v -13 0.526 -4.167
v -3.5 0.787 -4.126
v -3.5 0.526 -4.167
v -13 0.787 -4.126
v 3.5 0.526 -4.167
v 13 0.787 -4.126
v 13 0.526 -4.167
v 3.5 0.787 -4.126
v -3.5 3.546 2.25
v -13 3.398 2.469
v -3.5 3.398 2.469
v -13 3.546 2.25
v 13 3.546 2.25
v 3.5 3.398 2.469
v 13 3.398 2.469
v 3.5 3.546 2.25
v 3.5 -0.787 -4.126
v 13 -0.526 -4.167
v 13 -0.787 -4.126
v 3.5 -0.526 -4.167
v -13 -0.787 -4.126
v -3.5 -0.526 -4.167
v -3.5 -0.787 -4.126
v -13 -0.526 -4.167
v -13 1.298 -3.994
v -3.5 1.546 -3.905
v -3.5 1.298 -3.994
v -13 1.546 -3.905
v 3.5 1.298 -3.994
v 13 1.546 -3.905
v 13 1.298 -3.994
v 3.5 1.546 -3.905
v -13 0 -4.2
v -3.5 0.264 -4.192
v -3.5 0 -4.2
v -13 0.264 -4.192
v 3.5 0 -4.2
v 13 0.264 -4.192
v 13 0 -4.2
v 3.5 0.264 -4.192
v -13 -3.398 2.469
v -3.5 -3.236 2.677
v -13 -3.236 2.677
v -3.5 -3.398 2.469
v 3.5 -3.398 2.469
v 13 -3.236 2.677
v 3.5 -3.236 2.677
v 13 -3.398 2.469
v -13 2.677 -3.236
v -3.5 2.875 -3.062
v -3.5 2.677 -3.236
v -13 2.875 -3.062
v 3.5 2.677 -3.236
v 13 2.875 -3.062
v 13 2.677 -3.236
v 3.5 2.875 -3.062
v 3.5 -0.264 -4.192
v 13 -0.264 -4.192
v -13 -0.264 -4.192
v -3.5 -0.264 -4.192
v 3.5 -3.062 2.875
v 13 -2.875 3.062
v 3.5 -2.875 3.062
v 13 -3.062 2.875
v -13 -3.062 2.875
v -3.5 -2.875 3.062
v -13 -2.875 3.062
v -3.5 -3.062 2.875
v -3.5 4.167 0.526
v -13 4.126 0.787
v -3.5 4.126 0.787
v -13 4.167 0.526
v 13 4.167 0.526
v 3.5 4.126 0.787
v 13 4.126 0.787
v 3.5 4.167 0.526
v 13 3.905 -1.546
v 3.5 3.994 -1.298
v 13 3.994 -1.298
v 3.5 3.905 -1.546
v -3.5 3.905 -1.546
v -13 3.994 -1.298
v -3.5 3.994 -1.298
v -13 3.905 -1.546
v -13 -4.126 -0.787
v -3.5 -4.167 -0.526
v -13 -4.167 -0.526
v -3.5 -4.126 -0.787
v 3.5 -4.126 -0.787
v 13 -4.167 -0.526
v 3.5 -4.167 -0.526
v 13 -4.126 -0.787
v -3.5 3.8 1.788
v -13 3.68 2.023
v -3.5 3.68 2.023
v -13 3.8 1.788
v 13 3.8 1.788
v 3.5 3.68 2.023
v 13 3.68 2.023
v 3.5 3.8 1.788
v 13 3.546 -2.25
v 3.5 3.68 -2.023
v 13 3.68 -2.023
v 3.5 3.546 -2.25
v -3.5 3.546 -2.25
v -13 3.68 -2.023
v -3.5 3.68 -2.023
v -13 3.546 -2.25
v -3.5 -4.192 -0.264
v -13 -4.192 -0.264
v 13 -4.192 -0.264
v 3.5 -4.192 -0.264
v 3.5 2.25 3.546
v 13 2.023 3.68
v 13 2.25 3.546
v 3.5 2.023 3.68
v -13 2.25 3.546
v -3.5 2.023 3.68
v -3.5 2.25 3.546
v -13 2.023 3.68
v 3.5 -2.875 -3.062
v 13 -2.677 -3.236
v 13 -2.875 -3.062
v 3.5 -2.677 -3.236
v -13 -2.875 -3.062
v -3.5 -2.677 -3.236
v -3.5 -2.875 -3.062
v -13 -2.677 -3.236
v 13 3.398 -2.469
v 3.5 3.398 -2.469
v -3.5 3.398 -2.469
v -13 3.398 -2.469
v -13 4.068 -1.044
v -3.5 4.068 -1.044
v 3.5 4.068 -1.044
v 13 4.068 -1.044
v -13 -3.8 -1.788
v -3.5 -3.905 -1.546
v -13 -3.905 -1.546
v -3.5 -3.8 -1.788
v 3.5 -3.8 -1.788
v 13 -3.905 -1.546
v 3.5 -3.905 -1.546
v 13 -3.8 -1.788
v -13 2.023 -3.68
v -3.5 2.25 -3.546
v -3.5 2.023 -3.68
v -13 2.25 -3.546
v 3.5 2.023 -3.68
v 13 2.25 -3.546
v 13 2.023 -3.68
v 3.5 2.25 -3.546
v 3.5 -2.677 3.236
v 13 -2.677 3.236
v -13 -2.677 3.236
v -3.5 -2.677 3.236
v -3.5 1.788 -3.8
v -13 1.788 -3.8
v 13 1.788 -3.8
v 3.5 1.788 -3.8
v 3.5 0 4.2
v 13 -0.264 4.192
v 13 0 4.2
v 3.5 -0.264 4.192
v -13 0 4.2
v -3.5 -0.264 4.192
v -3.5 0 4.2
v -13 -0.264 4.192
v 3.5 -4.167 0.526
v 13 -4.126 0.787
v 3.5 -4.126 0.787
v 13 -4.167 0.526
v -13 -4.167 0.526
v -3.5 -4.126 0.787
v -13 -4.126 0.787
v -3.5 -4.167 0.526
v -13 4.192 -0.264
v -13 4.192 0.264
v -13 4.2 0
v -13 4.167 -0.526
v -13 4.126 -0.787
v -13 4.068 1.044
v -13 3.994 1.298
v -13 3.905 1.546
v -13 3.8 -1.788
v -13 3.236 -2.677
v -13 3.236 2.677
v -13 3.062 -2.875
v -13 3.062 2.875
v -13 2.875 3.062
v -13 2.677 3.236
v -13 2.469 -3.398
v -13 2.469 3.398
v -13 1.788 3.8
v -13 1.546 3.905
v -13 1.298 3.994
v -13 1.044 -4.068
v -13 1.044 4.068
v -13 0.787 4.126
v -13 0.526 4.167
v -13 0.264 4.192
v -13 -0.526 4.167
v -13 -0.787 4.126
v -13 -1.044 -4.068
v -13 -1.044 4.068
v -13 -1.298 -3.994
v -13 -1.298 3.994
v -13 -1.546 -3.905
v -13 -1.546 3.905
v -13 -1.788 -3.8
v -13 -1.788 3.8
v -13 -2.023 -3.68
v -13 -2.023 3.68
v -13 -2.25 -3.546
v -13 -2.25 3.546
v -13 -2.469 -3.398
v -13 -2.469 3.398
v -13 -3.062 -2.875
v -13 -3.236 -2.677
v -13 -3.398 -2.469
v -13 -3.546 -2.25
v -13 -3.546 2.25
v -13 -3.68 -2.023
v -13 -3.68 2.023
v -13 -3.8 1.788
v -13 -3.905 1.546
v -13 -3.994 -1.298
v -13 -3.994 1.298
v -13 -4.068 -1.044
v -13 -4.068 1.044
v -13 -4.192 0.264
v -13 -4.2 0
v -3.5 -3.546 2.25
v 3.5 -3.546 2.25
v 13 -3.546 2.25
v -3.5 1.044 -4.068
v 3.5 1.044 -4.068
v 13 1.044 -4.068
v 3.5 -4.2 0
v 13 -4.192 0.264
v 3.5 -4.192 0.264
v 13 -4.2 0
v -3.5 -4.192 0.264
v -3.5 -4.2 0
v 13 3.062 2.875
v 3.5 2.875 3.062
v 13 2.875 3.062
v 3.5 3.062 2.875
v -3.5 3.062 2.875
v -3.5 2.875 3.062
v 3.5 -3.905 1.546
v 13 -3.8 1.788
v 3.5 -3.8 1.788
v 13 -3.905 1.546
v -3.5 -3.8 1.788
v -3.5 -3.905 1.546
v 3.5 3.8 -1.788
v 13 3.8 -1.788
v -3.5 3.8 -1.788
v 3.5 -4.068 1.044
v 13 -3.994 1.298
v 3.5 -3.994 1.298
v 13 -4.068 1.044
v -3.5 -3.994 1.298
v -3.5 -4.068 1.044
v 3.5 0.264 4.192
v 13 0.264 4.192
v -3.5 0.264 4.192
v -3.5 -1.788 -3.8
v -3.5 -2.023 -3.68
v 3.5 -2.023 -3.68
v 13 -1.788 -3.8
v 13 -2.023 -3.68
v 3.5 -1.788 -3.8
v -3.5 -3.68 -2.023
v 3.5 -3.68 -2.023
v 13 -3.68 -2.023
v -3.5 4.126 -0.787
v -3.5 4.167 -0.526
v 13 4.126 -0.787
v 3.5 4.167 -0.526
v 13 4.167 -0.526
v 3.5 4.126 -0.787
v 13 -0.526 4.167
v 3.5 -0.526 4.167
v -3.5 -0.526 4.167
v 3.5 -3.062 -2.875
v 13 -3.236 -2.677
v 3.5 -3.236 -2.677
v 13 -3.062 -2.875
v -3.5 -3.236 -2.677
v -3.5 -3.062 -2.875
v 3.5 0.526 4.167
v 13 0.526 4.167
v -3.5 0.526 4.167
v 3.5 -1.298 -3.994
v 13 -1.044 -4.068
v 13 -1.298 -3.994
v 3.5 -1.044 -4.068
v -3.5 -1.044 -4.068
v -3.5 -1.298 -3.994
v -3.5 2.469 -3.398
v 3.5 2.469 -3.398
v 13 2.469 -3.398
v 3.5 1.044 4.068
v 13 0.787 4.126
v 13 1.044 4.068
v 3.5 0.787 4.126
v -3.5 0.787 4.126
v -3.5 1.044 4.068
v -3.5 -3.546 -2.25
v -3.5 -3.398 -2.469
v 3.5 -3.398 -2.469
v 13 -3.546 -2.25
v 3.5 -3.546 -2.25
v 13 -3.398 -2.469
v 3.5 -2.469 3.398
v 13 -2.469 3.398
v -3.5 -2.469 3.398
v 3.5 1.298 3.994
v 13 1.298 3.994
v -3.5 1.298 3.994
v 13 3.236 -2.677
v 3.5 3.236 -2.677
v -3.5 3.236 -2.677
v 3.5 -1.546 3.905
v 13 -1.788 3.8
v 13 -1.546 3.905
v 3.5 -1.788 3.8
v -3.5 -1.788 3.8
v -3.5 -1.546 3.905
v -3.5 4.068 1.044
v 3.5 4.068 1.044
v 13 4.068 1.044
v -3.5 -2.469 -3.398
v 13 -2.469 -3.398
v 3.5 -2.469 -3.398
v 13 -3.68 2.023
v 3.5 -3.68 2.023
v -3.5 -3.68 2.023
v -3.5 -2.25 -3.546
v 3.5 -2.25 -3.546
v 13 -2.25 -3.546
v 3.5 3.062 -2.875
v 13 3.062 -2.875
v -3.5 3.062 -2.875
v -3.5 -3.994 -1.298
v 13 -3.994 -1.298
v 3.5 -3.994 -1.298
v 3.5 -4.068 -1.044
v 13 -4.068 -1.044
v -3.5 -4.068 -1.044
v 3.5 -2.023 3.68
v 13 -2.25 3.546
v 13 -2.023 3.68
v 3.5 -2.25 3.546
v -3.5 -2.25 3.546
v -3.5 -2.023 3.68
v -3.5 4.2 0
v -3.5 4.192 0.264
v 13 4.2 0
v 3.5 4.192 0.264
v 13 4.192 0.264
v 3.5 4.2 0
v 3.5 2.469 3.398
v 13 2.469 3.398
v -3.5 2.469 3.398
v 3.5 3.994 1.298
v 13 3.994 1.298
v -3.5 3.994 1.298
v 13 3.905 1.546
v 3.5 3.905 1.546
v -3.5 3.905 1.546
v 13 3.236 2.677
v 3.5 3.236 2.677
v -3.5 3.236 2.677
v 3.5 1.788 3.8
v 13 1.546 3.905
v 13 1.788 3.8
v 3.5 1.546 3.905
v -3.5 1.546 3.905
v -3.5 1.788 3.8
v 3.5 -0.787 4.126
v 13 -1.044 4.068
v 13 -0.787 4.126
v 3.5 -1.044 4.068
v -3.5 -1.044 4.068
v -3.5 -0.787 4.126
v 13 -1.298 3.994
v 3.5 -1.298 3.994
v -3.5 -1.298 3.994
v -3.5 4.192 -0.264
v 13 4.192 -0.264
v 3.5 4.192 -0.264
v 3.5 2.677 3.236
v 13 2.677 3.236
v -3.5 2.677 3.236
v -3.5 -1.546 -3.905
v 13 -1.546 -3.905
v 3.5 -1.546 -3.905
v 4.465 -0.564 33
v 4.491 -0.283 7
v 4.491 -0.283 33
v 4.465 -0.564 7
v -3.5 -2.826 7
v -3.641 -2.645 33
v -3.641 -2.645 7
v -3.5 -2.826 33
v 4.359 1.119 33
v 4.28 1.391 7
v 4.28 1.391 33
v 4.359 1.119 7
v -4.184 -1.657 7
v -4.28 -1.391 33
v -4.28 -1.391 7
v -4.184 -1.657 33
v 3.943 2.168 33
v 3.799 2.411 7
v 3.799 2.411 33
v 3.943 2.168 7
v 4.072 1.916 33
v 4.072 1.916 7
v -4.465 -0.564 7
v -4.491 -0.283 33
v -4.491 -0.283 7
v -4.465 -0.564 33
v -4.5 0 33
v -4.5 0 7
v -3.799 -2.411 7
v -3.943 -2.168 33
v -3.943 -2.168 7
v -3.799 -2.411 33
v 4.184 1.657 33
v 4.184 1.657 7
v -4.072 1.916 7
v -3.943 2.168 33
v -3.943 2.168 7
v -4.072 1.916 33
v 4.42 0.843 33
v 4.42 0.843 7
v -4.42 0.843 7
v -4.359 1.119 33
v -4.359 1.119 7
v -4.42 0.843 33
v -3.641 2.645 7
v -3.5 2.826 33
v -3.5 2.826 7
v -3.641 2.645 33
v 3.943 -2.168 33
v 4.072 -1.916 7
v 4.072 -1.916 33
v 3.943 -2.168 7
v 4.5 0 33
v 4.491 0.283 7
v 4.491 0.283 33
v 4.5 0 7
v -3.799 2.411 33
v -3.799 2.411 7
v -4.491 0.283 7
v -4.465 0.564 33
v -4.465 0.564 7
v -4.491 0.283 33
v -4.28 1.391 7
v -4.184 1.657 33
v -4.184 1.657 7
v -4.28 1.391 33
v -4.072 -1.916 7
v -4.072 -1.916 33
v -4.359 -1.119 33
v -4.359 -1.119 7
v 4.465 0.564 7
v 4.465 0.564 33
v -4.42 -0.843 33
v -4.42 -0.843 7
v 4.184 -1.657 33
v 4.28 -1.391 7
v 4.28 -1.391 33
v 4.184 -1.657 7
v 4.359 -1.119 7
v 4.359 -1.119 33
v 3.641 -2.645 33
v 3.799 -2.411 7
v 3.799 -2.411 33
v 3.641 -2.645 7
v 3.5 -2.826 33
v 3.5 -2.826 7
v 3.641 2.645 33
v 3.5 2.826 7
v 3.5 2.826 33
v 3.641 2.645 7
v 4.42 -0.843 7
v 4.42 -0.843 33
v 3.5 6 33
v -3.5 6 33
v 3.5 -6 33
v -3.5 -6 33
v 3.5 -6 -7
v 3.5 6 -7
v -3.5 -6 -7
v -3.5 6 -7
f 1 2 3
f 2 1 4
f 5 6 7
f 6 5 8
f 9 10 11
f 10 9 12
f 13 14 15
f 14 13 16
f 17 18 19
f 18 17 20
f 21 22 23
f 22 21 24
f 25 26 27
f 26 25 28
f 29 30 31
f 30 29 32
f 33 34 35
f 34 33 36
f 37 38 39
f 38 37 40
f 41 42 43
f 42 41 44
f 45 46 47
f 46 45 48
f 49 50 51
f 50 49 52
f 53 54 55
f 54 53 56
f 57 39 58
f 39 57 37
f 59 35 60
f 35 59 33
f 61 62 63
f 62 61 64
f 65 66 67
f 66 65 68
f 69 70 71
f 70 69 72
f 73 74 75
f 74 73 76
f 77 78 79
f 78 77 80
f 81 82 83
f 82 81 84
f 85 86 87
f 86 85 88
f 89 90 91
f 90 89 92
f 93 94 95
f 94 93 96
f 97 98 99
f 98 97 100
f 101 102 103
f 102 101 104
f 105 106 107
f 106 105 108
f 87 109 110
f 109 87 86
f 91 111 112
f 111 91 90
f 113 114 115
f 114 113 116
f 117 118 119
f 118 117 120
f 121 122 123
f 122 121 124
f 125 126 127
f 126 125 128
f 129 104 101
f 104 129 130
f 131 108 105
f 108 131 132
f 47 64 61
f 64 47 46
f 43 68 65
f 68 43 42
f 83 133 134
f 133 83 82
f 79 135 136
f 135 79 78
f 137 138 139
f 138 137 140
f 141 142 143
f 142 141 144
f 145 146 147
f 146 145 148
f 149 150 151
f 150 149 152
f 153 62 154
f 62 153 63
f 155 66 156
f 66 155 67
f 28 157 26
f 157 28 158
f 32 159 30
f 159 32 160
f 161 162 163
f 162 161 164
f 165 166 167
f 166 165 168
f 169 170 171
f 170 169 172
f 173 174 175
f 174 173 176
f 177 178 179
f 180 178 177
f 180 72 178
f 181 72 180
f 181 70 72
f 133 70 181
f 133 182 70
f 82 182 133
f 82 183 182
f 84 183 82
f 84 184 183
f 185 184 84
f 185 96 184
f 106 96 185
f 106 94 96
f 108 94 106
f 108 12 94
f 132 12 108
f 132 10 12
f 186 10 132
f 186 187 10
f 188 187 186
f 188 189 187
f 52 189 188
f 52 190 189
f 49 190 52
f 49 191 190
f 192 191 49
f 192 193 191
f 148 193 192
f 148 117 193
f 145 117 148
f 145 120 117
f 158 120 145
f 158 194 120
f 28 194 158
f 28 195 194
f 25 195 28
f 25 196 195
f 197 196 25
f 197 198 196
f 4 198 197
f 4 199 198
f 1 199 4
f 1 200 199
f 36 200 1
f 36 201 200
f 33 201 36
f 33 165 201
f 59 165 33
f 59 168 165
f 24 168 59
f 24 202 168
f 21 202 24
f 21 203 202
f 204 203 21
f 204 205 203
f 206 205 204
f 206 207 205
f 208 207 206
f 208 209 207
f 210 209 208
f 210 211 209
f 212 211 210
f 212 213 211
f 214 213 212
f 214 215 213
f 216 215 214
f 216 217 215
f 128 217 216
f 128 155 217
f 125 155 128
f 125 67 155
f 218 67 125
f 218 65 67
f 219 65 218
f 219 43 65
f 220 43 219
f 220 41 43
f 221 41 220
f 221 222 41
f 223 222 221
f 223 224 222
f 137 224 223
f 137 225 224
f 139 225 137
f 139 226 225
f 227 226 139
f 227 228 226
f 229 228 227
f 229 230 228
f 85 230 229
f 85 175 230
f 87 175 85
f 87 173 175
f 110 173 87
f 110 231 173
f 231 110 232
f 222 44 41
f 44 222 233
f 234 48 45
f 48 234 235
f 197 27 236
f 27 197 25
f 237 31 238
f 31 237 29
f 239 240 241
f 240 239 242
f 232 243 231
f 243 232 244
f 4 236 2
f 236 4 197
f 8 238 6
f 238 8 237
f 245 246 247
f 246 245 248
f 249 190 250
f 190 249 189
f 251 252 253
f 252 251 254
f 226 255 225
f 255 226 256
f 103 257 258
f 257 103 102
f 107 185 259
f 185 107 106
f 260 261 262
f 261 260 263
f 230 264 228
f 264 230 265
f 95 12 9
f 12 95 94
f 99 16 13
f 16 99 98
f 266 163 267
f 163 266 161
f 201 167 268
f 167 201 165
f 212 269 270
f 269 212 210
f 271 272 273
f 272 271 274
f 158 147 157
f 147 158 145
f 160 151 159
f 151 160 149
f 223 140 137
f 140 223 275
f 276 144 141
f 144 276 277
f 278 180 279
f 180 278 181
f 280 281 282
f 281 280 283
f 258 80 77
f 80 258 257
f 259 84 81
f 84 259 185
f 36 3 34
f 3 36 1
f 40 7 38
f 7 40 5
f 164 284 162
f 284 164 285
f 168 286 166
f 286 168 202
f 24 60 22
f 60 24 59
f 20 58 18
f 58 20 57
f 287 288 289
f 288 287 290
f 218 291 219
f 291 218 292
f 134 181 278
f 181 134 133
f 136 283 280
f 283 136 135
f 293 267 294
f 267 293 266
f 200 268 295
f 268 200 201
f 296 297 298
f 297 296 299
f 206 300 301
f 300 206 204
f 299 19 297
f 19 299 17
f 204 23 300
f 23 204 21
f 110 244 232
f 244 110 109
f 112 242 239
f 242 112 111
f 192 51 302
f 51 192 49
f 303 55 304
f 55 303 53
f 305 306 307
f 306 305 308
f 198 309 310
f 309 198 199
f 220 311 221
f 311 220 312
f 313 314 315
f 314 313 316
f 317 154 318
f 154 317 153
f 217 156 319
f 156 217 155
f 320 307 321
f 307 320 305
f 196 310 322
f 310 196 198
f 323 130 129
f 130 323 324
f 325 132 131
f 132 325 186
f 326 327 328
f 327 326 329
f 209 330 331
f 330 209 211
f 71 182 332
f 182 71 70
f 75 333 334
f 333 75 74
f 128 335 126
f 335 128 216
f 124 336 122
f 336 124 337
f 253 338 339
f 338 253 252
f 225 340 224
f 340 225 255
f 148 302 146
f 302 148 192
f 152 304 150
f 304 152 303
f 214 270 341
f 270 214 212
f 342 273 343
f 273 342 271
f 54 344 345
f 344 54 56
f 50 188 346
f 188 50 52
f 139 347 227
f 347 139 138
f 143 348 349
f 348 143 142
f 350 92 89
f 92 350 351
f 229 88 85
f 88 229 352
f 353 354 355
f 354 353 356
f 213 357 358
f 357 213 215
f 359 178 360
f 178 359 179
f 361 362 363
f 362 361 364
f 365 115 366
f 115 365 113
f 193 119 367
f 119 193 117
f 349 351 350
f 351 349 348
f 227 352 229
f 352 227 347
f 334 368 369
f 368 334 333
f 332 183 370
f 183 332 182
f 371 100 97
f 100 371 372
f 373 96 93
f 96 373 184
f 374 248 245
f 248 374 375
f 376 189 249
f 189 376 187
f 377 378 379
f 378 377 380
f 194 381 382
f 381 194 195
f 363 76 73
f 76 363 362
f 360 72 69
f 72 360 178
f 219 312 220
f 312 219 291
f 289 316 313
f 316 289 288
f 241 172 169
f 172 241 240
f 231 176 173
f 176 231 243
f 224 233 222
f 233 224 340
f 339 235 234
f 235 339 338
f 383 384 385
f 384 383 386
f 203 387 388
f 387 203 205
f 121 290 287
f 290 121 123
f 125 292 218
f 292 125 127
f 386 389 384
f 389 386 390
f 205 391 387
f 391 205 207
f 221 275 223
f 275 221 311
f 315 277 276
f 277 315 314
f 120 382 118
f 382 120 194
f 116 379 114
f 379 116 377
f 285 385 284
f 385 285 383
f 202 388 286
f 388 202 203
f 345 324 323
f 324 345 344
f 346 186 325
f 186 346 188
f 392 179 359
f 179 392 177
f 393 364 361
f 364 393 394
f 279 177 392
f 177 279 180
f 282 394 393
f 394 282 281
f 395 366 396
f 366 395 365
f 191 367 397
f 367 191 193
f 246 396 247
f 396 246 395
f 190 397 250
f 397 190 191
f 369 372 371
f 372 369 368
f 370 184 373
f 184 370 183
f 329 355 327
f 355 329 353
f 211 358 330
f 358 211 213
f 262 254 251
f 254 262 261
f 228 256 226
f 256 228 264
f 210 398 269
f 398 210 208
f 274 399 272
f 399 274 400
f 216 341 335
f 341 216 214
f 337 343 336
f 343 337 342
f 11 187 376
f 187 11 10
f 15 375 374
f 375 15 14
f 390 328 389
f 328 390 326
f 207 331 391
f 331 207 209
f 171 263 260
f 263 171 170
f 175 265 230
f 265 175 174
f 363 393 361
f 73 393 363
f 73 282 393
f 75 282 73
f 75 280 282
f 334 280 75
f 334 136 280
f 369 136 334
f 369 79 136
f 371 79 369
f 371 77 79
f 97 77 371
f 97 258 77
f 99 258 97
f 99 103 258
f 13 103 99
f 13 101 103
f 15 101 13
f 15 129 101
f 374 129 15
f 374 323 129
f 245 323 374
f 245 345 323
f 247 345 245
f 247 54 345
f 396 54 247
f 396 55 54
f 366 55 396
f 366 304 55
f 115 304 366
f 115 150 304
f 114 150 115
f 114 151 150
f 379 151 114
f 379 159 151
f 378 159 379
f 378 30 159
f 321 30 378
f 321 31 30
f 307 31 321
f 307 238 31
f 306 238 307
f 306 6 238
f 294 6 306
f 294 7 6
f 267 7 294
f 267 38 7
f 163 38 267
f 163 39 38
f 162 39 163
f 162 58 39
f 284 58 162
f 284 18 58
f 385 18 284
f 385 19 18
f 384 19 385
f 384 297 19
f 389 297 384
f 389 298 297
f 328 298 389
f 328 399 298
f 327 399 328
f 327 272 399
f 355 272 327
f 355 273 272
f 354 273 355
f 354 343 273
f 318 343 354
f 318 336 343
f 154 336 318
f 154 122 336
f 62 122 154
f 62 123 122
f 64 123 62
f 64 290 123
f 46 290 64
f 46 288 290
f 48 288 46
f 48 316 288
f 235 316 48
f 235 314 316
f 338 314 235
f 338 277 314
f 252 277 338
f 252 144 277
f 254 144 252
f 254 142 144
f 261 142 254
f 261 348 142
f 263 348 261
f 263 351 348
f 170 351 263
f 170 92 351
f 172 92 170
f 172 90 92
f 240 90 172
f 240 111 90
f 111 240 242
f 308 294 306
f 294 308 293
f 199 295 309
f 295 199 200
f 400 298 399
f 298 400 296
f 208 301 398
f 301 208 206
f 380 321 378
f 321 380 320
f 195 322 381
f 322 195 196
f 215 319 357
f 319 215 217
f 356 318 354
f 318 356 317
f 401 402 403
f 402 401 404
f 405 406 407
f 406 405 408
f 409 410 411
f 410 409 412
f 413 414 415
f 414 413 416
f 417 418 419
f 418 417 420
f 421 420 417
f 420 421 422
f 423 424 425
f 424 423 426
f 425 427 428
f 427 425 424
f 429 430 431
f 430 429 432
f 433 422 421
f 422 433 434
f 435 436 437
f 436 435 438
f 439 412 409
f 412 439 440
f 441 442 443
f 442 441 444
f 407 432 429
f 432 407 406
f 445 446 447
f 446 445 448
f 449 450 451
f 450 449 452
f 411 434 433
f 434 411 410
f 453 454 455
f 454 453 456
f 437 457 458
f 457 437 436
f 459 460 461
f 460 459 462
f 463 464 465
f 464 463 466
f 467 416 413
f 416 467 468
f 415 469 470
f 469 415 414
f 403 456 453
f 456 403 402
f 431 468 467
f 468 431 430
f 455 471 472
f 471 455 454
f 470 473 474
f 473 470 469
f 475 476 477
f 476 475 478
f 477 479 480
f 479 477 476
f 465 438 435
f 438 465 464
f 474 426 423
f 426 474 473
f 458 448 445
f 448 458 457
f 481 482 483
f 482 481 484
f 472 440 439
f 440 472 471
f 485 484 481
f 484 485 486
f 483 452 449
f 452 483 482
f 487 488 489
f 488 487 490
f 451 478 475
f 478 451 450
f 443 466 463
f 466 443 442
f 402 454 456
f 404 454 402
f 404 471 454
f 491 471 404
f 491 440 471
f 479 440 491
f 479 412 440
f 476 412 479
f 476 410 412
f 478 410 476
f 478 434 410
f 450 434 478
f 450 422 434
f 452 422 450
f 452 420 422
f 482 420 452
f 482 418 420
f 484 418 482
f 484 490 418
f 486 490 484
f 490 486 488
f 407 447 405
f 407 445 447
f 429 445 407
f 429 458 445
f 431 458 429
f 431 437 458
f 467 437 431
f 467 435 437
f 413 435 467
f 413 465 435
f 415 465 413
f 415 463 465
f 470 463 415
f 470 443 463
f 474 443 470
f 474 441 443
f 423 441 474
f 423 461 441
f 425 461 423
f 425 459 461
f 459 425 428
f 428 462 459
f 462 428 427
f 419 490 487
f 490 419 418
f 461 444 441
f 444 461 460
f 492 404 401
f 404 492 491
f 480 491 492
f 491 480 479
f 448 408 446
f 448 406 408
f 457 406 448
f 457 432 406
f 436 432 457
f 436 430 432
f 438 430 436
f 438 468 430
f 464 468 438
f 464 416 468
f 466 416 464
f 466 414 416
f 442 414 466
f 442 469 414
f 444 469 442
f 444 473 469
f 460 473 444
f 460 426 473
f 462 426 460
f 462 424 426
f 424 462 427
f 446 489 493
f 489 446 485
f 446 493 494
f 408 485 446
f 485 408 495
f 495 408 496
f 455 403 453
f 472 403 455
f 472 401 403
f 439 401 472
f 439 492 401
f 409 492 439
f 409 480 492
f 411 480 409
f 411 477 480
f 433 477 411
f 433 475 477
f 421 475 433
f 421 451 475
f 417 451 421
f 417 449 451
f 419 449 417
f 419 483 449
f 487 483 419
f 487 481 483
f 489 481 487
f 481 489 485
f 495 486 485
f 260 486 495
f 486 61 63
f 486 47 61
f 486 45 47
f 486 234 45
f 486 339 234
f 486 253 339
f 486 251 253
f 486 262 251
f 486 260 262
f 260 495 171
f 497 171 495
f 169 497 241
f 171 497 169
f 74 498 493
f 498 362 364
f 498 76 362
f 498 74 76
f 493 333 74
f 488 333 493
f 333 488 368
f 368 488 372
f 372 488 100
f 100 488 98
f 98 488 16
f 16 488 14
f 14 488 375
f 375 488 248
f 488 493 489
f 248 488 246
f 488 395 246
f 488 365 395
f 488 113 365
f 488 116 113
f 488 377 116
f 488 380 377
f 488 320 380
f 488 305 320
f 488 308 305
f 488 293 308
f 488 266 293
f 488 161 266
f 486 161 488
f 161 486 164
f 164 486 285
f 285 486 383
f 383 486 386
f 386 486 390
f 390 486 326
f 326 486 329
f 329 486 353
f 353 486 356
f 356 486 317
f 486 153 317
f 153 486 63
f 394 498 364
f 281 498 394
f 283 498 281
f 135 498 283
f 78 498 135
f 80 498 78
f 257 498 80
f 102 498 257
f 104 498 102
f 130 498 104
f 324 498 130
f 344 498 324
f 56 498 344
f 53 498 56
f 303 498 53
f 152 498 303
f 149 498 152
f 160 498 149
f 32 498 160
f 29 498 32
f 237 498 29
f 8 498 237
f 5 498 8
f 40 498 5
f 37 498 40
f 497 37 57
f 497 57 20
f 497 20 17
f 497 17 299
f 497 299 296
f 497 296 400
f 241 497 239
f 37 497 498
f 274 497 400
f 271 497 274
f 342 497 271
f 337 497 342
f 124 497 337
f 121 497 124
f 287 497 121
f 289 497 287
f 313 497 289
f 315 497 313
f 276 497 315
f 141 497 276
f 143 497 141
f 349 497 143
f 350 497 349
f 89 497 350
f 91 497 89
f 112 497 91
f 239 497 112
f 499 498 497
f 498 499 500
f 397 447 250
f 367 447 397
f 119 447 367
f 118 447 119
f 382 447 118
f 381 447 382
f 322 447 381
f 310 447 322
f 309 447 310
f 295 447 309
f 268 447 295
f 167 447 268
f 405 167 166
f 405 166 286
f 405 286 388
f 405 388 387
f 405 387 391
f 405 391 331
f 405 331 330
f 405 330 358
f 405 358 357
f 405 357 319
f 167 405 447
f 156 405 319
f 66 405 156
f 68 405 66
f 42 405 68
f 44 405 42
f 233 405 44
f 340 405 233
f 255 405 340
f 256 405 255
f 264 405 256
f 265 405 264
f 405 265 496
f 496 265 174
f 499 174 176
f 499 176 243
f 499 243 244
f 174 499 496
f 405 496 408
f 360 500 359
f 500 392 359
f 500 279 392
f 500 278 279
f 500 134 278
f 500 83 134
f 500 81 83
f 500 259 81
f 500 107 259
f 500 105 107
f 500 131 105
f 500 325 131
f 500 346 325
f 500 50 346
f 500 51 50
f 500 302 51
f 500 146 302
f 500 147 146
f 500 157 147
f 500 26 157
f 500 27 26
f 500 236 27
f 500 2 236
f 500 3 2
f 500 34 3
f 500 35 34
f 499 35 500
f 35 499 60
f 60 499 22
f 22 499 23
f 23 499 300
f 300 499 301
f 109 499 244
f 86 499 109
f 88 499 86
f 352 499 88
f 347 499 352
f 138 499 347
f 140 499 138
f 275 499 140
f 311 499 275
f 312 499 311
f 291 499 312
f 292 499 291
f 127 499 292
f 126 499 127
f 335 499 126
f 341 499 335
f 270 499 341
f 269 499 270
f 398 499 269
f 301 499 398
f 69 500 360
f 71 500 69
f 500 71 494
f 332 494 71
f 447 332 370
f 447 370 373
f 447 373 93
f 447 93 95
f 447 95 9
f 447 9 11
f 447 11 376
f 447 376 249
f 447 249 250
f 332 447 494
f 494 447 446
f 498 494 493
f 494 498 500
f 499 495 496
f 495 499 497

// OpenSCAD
translate([0,-7,-7]){


        difference(){
            union(){

                translate([-13,7,7]){
                    rotate([0,90,0]){
                        cylinder(h=26, r=4.2, $fn=100, center=false);
                    }
                }  


                translate([0,7,14]){
                    rotate([0,0,90]){
                        cylinder(h=40-14, r=4.5, $fn=100, center=false);
                    }
                }  

                translate([10,7,7]){
                    rotate([0,0,90]){
//                        cylinder(h=40-7, r=1.2, $fn=100, center=false);
                    }
                }  
                translate([-10,7,7]){
                    rotate([0,0,90]){
//                        cylinder(h=40-7, r=1.2, $fn=100, center=false);
                    }
                }  


                translate([-3.5,1,0]){
                    cube([7,12,40], center=false);
                }

            }
            union() {



            }
        }
}
